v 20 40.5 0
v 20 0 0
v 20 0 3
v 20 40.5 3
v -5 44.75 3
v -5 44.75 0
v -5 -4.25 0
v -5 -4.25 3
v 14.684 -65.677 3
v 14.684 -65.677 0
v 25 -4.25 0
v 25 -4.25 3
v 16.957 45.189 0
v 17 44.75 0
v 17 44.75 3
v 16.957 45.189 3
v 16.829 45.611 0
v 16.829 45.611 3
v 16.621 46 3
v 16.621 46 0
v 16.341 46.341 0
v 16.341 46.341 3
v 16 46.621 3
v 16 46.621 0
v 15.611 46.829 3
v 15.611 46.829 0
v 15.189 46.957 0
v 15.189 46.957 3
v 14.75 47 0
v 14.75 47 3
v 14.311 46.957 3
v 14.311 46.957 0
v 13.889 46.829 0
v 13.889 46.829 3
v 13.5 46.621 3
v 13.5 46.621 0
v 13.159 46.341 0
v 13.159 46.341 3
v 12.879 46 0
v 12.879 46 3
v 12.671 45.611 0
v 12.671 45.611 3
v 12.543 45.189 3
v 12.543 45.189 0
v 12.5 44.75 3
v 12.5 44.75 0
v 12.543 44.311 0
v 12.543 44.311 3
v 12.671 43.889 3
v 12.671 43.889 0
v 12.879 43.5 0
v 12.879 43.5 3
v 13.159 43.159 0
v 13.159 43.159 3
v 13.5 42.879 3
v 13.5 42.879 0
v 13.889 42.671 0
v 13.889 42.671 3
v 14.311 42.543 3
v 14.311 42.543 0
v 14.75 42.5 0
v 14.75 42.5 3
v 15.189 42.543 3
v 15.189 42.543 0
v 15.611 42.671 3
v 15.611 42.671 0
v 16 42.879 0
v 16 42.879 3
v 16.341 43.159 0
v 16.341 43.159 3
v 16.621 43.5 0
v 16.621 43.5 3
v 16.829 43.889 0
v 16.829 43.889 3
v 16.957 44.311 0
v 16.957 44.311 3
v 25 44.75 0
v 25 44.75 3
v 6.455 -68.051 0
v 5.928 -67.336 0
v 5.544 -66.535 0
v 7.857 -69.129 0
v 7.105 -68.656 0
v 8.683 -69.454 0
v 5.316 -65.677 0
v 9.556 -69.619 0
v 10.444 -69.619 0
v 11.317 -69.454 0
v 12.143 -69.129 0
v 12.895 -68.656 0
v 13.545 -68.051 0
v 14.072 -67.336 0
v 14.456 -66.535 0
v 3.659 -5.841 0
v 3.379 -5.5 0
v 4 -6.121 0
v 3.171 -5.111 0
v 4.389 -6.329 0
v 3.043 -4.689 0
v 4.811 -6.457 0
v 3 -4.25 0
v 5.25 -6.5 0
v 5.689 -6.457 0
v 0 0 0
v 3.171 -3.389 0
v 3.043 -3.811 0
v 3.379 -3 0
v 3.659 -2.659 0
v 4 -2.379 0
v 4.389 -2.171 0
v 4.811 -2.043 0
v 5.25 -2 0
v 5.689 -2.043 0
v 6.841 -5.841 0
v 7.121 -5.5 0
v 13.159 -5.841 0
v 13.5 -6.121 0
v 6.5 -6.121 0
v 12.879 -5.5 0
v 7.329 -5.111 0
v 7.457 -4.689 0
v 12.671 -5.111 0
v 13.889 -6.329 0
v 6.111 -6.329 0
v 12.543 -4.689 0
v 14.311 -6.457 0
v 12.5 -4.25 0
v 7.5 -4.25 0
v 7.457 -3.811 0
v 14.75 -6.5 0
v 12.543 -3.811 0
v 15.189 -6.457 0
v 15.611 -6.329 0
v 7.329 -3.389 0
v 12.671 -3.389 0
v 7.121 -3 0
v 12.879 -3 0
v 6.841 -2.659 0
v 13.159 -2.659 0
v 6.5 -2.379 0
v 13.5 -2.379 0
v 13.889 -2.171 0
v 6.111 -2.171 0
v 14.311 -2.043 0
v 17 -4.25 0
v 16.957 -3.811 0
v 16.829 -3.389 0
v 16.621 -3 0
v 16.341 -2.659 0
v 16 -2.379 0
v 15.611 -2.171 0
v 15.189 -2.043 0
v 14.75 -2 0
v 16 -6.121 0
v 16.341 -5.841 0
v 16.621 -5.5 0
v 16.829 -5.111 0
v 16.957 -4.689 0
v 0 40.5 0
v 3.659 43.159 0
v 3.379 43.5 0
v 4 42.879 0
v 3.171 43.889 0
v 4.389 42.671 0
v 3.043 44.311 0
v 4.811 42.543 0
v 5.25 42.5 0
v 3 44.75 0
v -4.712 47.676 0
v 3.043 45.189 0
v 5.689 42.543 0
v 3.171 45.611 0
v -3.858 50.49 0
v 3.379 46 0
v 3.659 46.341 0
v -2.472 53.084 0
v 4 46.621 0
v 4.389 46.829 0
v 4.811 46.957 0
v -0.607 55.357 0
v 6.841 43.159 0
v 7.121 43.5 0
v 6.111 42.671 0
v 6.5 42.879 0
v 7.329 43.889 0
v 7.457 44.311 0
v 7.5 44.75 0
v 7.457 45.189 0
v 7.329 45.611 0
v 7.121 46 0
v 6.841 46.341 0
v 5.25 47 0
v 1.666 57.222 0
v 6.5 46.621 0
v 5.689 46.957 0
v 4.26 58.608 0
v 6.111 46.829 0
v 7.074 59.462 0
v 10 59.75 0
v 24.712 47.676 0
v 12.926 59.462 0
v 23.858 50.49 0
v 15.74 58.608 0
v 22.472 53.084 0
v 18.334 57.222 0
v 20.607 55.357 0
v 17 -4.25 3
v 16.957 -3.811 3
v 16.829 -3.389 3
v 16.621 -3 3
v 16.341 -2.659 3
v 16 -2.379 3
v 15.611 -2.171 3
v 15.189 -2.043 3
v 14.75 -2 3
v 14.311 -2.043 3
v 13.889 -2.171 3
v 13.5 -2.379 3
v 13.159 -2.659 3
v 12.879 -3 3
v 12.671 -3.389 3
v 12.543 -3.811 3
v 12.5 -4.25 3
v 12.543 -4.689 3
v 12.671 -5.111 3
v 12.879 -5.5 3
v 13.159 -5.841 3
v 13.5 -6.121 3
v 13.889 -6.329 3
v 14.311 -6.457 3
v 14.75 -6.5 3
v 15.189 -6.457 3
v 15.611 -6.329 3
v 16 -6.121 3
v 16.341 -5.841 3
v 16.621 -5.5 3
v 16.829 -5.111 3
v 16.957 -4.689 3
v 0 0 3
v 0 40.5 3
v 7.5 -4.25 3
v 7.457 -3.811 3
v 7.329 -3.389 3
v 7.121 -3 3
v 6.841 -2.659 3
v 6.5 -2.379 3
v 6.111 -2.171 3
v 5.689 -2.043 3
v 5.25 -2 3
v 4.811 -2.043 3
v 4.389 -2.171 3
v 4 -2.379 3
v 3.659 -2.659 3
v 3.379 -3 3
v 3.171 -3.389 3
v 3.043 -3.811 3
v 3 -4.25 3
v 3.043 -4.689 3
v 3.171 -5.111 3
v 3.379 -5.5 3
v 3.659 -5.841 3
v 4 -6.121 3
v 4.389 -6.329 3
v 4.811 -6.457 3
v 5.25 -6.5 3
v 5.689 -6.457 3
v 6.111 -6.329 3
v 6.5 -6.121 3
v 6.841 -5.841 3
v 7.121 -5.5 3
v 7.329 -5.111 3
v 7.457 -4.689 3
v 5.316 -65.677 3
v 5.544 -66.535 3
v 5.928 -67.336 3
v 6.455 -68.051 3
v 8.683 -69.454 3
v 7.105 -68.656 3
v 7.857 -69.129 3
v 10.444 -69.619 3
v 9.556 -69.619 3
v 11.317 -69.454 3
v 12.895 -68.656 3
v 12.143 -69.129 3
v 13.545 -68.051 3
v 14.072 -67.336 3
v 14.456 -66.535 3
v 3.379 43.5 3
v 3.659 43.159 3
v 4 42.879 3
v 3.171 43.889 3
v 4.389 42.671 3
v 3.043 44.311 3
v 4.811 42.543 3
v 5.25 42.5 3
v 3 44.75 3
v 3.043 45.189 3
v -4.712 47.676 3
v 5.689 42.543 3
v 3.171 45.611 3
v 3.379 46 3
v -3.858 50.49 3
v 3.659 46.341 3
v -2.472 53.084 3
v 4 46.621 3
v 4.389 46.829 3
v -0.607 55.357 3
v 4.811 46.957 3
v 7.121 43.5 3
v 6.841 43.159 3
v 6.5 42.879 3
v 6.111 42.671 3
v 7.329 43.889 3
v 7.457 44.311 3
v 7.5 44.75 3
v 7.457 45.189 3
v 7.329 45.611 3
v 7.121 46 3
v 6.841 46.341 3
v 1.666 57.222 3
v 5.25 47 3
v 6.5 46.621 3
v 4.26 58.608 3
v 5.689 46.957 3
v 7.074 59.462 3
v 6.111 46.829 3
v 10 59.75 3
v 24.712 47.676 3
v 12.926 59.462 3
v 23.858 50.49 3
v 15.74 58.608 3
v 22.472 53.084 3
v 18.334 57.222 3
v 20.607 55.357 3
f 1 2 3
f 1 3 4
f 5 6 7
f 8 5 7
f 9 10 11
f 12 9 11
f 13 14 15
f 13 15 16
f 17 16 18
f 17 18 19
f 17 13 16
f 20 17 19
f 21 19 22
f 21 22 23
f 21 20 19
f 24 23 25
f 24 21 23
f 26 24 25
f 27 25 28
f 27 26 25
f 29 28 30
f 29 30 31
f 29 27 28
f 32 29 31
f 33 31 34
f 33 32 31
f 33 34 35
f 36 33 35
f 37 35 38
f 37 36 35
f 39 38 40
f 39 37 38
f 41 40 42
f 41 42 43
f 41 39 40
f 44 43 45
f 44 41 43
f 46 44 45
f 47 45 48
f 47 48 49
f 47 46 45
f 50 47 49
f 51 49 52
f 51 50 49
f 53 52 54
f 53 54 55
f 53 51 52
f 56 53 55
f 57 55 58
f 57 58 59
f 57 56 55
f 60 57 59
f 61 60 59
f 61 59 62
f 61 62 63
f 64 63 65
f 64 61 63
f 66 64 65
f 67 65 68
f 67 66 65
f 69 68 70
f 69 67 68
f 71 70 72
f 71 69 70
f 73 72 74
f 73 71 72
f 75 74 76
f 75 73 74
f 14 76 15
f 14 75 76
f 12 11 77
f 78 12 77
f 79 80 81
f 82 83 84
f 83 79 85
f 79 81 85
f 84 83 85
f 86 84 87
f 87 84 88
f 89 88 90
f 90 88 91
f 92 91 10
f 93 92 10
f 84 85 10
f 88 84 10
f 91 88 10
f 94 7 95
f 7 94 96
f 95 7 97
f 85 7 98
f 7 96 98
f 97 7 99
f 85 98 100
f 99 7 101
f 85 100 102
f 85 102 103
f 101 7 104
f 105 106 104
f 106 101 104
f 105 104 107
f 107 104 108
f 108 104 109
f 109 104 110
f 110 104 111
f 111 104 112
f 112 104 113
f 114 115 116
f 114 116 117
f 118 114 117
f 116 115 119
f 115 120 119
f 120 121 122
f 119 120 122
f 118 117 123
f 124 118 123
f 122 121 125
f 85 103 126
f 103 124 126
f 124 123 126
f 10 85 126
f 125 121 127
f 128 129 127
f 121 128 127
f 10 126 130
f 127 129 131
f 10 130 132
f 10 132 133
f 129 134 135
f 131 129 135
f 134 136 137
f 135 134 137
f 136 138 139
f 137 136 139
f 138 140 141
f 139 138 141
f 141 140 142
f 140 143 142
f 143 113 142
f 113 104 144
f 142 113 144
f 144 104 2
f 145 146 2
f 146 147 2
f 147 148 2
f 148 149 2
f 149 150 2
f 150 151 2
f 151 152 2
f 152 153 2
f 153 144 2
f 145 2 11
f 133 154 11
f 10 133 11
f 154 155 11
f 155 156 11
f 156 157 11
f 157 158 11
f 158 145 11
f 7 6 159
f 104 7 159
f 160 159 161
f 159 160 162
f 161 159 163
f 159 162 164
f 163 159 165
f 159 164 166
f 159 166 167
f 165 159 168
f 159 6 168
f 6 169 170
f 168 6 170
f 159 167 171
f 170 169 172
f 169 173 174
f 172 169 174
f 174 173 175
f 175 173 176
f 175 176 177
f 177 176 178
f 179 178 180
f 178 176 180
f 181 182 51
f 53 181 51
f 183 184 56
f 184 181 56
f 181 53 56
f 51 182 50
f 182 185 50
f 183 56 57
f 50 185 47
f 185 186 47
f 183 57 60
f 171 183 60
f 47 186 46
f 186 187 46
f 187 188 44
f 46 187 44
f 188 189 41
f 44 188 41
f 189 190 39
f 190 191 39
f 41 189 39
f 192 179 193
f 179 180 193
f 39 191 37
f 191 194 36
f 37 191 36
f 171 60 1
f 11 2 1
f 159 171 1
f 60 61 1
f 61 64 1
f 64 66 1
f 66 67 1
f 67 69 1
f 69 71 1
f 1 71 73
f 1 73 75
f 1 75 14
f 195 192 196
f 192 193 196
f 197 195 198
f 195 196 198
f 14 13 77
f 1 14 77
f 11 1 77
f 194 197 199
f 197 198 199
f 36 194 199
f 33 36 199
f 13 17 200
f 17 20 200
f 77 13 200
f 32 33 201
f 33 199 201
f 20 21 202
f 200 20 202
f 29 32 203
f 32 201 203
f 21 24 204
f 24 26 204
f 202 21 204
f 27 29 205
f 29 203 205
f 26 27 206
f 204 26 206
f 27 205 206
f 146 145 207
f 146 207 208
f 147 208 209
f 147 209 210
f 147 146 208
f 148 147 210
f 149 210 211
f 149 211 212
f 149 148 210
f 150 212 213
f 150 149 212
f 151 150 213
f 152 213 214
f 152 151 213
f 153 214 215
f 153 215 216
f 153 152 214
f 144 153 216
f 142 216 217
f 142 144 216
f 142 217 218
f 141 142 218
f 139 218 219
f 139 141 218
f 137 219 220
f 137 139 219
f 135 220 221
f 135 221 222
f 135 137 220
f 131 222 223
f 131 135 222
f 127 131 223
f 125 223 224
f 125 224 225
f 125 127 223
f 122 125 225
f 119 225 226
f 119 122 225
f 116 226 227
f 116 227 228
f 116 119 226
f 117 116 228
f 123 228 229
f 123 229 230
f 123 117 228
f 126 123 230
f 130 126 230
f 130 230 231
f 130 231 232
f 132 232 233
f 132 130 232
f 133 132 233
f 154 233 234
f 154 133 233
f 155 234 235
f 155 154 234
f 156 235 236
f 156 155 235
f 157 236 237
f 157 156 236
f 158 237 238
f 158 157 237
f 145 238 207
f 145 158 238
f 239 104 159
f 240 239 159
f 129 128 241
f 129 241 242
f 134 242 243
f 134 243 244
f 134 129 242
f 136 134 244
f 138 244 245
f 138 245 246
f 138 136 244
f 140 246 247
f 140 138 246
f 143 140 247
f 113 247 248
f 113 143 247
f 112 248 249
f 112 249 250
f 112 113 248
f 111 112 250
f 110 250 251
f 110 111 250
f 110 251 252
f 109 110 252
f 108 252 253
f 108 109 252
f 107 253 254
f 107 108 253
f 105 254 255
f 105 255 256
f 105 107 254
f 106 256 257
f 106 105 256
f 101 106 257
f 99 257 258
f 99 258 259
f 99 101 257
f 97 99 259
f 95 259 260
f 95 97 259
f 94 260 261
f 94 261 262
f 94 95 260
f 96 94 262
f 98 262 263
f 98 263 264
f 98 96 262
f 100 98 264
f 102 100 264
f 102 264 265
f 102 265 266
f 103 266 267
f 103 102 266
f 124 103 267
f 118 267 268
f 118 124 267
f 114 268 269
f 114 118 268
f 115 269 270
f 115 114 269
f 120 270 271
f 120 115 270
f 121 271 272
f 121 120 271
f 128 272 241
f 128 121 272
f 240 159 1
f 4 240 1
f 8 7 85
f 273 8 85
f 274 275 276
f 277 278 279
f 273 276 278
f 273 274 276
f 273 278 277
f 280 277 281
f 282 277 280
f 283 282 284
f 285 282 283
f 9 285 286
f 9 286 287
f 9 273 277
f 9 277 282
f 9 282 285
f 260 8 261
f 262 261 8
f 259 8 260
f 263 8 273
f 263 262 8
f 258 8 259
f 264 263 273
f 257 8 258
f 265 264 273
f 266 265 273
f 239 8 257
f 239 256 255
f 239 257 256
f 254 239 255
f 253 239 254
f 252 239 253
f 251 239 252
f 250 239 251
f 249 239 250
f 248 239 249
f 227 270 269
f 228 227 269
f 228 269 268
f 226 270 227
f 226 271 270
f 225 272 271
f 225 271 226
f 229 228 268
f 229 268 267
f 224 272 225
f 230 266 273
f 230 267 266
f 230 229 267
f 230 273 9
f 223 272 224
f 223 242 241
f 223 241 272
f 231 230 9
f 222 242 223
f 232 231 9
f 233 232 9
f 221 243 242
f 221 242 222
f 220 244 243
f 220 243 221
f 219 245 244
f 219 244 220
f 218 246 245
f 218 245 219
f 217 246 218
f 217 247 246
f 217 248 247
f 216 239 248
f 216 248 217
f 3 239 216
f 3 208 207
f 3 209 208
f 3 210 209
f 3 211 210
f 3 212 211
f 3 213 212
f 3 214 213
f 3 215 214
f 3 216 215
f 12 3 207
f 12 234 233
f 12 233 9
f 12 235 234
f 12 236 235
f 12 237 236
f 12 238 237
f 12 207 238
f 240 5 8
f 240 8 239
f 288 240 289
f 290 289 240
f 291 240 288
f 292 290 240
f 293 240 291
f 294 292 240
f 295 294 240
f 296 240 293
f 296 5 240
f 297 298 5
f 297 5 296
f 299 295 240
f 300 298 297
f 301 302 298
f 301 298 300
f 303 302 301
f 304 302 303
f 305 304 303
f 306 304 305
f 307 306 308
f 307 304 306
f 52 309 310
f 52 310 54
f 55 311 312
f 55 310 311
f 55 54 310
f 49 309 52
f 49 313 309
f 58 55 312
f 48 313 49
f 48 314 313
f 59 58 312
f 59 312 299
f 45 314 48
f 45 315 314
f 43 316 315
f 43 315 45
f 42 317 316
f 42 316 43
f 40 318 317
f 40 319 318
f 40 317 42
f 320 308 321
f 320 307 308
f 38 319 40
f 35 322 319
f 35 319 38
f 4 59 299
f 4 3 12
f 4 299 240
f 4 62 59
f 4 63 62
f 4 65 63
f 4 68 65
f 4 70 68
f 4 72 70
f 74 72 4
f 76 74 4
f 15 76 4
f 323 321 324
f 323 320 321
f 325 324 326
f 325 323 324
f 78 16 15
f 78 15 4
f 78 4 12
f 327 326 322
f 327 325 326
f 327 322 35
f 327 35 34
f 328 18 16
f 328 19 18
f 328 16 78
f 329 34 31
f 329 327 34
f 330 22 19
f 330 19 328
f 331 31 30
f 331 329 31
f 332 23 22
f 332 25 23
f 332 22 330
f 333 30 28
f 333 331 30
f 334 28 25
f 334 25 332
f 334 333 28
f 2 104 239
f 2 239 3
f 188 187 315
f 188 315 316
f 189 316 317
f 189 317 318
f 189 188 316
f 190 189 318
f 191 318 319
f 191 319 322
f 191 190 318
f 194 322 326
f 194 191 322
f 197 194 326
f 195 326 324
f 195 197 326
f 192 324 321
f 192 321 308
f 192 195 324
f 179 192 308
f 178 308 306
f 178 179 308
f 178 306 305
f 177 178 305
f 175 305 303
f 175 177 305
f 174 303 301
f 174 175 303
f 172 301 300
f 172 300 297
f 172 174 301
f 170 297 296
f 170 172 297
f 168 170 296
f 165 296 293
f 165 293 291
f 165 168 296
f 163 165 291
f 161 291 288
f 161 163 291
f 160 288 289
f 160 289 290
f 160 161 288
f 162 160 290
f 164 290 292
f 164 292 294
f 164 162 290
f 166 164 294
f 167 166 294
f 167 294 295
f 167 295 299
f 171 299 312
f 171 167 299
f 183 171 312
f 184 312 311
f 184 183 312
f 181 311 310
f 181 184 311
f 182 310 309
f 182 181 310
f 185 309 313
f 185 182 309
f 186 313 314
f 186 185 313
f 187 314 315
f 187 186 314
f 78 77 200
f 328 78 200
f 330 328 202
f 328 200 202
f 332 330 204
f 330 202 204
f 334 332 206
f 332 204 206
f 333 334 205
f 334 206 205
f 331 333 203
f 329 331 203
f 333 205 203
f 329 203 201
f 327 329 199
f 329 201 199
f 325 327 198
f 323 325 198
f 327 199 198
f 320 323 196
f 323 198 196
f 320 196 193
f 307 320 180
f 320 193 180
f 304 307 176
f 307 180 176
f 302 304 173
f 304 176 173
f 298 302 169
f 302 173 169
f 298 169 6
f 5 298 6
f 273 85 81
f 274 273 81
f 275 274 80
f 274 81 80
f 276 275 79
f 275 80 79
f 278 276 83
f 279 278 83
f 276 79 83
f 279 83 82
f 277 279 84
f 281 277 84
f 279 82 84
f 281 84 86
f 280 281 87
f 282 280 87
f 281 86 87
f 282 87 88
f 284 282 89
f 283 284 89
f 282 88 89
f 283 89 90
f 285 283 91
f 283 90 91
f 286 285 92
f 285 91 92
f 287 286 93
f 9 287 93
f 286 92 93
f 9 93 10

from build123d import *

# Parameters (mm, degrees)
SKETCH1_R           = 2.25
SKETCH1_W           = 20
SKETCH1_H           = 40.5
BOSS_EXTRUDE1_DEPTH = 3


with BuildPart() as part:
    # Sketch1 → Boss-Extrude1 (new body)
    with BuildSketch(Plane.XY):
        with BuildLine():
            Line((-5, 44.75), (-5, -4.25))
            Line((-5, -4.25), (5.31559474, -65.676668518))
            ThreePointArc((5.31559474, -65.676668518), (10, -69.64), (14.68440526, -65.676668518))
            Line((14.68440526, -65.676668518), (25, -4.25))
            Line((25, -4.25), (25, 44.75))
            ThreePointArc((25, 44.75), (10, 59.75), (-5, 44.75))
        make_face()
        with Locations((14.75, -4.25)):
            Circle(SKETCH1_R, mode=Mode.SUBTRACT)
        with Locations((5.25, -4.25)):
            Circle(SKETCH1_R, mode=Mode.SUBTRACT)
        with Locations((14.75, 44.75)):
            Circle(SKETCH1_R, mode=Mode.SUBTRACT)
        with Locations((5.25, 44.75)):
            Circle(SKETCH1_R, mode=Mode.SUBTRACT)
        with Locations((10, 20.25)):
            Rectangle(SKETCH1_W, SKETCH1_H, mode=Mode.SUBTRACT)
    extrude(amount=BOSS_EXTRUDE1_DEPTH)


solid = part.part
